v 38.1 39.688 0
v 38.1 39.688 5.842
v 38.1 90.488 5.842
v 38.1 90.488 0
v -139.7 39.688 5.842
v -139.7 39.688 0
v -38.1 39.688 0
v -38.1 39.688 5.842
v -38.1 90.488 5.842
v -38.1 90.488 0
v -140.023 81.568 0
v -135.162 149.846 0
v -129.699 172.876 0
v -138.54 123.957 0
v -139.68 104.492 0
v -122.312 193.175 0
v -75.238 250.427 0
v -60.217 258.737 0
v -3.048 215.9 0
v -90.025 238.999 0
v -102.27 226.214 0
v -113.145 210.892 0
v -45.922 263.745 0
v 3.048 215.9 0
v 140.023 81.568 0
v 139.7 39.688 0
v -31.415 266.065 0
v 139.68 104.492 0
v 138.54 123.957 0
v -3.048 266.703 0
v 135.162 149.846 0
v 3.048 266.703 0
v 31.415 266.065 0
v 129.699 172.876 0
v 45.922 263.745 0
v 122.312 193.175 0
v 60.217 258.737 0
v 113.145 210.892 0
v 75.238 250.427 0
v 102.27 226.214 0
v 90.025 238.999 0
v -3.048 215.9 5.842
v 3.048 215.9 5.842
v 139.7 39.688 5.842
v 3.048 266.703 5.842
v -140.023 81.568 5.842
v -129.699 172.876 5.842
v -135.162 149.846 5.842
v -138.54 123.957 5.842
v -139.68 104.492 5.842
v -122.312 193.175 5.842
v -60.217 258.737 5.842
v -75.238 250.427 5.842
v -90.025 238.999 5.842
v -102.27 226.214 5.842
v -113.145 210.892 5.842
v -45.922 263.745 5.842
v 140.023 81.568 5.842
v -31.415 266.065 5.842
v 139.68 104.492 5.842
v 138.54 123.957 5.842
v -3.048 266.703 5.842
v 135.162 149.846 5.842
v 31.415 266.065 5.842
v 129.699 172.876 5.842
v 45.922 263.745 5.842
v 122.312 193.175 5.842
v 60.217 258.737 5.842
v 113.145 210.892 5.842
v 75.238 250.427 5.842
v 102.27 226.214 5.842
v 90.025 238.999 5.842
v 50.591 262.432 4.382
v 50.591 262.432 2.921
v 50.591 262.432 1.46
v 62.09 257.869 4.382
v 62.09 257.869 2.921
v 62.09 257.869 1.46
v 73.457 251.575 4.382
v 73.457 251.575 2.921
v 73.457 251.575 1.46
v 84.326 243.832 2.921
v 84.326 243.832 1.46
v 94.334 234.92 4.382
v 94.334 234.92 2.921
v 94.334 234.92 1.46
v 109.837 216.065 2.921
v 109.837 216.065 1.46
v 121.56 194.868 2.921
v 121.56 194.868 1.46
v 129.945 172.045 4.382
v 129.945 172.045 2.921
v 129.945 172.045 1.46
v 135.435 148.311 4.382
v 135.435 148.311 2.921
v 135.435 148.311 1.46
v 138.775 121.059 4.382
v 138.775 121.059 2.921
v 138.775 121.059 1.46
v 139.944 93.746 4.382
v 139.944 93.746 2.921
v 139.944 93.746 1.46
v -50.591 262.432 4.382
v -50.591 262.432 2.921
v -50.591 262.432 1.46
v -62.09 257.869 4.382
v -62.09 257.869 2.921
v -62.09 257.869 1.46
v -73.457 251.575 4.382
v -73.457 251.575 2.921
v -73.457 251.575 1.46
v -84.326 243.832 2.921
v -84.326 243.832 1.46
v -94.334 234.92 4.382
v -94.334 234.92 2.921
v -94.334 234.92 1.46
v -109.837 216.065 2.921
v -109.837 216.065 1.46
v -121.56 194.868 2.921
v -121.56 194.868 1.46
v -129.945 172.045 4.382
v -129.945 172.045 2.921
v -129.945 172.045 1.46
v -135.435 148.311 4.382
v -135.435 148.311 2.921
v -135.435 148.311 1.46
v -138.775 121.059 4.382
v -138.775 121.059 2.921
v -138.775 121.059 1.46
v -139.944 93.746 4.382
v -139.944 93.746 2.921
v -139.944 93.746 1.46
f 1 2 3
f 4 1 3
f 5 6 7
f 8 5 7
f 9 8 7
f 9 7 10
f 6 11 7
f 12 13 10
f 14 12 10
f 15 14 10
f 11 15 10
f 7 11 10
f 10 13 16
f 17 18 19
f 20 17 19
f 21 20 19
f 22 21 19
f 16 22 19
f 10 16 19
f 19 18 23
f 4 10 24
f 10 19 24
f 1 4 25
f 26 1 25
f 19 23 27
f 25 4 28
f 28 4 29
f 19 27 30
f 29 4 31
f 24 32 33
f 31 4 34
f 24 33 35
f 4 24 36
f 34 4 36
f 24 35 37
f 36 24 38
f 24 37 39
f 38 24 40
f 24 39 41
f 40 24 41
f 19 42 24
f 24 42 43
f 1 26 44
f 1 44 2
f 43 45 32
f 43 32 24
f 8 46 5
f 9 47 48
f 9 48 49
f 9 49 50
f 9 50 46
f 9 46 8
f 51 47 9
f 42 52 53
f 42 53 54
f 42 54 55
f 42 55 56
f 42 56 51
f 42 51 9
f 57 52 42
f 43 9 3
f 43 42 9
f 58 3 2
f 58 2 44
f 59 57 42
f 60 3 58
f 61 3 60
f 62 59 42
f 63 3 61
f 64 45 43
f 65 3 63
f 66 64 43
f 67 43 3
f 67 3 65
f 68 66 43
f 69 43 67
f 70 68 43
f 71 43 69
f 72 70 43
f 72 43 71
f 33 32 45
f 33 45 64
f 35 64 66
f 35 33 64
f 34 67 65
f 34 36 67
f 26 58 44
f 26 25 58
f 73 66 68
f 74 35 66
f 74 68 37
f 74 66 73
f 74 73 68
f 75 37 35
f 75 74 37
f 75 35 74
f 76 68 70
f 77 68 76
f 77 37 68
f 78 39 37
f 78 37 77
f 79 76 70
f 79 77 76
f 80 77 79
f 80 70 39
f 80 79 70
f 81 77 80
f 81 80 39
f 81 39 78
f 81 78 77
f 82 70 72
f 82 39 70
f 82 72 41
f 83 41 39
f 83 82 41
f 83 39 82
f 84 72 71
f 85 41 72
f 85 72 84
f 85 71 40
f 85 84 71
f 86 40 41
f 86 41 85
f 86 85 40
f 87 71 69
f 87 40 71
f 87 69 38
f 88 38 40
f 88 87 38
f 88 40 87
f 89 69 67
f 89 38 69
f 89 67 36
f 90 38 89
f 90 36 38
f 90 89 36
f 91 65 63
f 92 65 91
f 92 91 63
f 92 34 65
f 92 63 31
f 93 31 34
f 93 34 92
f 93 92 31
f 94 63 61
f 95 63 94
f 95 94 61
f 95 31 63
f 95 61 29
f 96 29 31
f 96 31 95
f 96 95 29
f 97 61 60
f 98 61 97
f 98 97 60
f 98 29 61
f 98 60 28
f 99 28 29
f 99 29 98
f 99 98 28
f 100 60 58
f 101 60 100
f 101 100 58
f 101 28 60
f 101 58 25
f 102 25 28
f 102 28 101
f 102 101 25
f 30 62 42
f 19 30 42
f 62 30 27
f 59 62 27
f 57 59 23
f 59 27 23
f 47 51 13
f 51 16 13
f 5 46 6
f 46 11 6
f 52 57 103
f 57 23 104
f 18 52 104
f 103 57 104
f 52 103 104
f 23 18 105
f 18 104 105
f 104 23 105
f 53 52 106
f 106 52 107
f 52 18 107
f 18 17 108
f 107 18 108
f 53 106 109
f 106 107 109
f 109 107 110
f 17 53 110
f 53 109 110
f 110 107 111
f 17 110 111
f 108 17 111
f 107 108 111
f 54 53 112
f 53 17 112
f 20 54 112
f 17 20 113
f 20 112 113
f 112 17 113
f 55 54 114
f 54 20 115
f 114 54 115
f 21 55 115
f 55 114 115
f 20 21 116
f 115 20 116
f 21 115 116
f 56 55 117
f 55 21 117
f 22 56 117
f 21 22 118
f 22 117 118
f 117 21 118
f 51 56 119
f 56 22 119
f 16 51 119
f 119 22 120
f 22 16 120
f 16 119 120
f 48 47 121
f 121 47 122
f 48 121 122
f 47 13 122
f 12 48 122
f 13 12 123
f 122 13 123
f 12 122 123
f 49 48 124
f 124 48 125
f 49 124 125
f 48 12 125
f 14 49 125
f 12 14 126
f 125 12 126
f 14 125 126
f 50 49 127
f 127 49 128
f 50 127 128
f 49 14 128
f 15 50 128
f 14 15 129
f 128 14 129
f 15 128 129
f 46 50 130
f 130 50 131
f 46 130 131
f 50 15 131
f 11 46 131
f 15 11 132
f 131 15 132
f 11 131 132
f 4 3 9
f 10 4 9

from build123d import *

# Parameters (mm, degrees)
BOSS_EXTRUDE1_DEPTH = 5.842
SKETCH3_W           = 38.1
SKETCH3_H           = 50.8
CUT_EXTRUDE1_DEPTH  = 302.290506827


with BuildPart() as part:
    # Sketch2 → Boss-Extrude1 (new body)
    with BuildSketch(Plane.XY):
        with BuildLine():
            Line((139.7, 39.6875), (0, 39.6875))
            Line((0, 39.6875), (0, 266.7))
            add(Edge.make_bspline(
                [(0, 266.7), (21.213326152, 266.7), (50.246788725, 267.616547831), (111.185848272, 228.593704445), (143.597858606, 144.621704947), (139.7, 75.222272686), (139.7, 39.6875)],
                knots=[0, 0, 0, 0, 0.165367143, 0.333681411, 0.645927816, 1, 1, 1, 1], degree=3))
        make_face()
    extrude(amount=BOSS_EXTRUDE1_DEPTH)

    # Sketch3 → Cut-Extrude1 (cut, through all)
    with BuildSketch(Plane.XY.offset(5.842)):
        Polygon((0, 266.7), (0, 268.866877319), (3.048, 268.866877319), (3.048, 215.9), (0, 215.9), align=None)
        with Locations((19.05, 65.0875)):
            Rectangle(SKETCH3_W, SKETCH3_H)
    extrude(amount=-CUT_EXTRUDE1_DEPTH, mode=Mode.SUBTRACT)

    # Mirror1: part across plane


with BuildPart() as part_1:
    add(part.part)
    add(part.part.mirror(Plane(origin=(0, 0, 0), x_dir=(0, 0, 1), z_dir=(1, 0, 0))))


solid = part_1.part
